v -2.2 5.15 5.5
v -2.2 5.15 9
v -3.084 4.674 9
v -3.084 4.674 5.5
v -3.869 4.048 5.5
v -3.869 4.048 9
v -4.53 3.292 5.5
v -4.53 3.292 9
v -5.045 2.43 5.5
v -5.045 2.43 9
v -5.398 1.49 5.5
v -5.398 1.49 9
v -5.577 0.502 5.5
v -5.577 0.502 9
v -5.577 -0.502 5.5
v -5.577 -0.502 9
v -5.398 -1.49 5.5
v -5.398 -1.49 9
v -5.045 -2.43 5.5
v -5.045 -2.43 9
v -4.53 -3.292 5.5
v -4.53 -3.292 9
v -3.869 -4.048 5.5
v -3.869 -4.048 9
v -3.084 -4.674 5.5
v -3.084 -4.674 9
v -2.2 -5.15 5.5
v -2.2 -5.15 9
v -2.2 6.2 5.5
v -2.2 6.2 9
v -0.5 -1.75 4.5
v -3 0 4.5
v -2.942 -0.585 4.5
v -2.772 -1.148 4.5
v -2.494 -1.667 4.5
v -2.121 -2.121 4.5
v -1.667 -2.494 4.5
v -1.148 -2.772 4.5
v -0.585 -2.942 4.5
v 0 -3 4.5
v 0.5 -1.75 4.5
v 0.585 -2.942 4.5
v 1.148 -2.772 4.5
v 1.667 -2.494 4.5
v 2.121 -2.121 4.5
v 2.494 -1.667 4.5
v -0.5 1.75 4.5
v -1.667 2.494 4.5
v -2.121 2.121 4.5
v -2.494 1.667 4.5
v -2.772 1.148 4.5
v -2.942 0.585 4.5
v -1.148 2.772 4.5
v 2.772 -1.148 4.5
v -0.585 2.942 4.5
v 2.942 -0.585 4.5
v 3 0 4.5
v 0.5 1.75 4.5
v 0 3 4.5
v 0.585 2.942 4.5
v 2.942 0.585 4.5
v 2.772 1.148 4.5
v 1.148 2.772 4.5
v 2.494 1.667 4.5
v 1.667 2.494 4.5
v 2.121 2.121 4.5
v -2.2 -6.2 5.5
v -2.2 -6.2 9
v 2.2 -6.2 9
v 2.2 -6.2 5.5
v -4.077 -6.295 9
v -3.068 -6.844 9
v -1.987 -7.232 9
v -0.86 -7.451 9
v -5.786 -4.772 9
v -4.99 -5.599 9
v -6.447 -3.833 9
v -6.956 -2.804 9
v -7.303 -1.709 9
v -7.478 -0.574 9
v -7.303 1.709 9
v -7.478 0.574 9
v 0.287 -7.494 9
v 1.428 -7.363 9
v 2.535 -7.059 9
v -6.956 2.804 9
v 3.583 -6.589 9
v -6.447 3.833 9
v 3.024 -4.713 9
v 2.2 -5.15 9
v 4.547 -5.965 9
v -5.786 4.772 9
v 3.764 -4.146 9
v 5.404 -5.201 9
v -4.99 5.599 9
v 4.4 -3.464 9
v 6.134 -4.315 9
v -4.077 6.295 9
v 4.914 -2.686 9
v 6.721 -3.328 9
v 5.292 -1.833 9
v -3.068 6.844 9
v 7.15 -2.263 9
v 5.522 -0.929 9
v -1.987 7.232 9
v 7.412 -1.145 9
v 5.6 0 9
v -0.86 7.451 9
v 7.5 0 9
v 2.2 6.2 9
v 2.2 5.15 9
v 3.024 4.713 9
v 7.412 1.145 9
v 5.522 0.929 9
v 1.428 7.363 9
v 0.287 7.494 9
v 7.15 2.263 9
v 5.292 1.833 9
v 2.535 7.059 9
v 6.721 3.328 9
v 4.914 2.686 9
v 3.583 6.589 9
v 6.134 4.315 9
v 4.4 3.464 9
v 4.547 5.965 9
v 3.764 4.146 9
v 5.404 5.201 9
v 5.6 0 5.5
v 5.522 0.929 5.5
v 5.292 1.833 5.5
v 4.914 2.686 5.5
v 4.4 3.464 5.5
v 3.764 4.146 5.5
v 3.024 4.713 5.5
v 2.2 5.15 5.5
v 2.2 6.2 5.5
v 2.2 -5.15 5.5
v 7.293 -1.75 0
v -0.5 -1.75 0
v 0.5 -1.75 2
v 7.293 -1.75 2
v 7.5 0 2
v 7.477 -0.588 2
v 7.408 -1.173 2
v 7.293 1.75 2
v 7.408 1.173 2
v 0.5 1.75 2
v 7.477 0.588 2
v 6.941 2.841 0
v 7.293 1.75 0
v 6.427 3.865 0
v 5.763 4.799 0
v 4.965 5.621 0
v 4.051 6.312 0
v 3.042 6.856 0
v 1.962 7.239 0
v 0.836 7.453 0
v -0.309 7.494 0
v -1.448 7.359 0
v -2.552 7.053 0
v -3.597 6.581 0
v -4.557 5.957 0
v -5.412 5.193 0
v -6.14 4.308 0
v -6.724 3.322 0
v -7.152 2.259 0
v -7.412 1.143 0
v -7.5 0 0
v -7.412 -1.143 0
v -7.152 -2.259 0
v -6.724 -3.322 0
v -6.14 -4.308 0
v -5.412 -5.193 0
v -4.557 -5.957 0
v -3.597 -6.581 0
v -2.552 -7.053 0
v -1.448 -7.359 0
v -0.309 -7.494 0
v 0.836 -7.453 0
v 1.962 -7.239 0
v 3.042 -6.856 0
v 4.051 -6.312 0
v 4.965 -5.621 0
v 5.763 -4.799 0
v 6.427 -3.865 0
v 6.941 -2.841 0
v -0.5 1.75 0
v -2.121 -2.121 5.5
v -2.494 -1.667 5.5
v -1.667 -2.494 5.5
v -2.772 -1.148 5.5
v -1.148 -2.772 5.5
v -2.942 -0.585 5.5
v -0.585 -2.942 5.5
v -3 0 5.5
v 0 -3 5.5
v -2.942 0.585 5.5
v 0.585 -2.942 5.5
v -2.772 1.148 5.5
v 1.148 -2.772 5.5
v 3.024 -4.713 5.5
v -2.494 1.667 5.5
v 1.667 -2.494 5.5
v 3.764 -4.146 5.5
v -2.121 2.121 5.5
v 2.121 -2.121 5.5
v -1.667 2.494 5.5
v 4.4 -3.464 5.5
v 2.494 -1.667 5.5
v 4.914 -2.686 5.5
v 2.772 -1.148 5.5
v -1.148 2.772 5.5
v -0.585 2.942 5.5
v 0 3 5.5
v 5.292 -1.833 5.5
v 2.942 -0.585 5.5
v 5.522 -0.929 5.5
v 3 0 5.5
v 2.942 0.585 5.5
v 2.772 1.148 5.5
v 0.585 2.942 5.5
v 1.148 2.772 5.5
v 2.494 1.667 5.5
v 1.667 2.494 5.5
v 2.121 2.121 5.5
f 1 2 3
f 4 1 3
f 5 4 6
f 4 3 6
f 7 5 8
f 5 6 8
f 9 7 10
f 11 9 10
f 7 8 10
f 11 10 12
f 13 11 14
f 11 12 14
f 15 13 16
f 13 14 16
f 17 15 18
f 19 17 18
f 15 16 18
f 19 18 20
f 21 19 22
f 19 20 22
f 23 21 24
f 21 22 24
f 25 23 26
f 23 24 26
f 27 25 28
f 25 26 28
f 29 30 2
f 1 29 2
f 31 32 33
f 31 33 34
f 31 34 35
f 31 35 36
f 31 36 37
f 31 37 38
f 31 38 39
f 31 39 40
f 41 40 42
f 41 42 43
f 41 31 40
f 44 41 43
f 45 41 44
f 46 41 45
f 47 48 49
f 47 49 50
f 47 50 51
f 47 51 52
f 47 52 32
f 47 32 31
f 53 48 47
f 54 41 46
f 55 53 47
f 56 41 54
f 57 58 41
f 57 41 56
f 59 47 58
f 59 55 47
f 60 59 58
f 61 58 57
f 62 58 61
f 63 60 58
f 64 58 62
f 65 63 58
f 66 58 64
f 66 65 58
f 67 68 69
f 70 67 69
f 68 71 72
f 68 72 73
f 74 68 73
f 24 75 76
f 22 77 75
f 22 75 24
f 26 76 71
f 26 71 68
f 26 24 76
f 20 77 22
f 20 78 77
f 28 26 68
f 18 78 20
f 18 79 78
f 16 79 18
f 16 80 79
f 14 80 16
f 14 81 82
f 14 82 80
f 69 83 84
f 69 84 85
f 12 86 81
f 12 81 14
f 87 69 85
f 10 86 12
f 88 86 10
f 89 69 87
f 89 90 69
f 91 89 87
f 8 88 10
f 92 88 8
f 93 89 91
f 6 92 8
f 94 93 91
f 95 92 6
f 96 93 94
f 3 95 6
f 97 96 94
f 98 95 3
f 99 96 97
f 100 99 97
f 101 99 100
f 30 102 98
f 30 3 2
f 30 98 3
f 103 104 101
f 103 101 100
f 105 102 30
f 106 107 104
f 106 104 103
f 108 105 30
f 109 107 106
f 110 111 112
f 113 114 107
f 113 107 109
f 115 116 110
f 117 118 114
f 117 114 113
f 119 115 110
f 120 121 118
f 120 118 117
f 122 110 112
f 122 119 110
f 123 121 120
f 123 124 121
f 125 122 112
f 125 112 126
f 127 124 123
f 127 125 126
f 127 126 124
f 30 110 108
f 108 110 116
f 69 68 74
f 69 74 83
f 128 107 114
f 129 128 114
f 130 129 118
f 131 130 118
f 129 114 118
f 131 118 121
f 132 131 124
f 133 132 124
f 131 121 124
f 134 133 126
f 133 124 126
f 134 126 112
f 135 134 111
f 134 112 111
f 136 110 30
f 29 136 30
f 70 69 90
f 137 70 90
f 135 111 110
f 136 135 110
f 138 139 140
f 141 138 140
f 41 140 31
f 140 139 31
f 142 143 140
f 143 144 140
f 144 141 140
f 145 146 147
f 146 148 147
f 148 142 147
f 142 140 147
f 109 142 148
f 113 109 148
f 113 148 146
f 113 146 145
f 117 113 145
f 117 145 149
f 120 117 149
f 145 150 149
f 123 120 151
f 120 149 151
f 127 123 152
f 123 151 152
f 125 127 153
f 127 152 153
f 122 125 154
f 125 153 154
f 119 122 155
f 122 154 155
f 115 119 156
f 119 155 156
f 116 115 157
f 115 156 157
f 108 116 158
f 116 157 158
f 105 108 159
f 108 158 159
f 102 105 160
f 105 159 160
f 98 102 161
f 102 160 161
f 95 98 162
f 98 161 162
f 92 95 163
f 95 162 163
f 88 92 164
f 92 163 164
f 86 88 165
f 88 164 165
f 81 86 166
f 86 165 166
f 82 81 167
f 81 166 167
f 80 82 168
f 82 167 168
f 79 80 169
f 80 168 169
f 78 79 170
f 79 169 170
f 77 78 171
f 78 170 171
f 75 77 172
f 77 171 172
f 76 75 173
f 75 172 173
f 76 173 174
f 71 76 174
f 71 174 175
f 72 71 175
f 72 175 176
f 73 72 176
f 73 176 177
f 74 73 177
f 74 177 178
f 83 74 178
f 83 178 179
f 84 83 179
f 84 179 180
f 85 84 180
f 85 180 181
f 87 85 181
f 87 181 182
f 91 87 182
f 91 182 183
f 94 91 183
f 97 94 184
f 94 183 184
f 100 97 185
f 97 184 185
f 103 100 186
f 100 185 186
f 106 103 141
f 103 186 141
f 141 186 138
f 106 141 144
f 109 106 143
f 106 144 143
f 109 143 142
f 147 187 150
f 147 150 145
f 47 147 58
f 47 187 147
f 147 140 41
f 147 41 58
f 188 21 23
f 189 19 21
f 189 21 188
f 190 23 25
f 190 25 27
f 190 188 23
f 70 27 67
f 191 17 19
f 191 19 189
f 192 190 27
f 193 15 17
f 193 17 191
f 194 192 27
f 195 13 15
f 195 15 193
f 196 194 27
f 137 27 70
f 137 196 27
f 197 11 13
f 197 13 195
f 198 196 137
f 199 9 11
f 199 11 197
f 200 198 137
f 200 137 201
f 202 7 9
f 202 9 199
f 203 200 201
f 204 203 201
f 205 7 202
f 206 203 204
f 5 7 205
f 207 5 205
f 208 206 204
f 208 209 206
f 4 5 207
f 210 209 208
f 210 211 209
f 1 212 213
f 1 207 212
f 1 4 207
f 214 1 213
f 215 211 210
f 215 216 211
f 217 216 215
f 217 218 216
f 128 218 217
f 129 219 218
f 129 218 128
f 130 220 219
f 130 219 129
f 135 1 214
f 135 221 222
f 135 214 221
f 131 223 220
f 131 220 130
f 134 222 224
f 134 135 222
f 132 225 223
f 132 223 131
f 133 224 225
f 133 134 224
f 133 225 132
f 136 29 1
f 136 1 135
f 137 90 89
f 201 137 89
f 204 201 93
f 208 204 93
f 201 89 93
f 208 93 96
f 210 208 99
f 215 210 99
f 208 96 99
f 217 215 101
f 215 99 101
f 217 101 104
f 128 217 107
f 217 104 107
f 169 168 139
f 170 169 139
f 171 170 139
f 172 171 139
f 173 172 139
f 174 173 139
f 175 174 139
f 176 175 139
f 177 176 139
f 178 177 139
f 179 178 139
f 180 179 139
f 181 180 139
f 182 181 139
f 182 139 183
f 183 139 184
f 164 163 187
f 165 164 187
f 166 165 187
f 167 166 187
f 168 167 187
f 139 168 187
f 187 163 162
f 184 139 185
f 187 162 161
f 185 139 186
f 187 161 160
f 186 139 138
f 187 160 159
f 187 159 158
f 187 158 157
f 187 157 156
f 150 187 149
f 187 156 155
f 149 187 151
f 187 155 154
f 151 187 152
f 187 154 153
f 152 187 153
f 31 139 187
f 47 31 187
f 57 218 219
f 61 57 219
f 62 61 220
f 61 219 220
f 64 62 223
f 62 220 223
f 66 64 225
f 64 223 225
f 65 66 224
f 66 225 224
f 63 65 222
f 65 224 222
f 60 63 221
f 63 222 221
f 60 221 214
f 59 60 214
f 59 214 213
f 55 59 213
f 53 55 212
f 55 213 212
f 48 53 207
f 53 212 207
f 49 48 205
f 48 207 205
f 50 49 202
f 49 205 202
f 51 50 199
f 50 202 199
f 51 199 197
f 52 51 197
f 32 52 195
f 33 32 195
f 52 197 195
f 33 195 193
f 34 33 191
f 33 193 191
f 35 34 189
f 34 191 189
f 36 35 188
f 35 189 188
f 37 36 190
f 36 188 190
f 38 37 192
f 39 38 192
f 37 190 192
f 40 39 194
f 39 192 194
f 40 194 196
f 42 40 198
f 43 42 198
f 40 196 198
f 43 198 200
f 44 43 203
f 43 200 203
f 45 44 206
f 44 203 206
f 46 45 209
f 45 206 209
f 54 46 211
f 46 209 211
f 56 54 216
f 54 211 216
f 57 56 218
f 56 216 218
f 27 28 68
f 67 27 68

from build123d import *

# Parameters (mm, degrees)
F0_R     = 7.5
F0_W     = 1
F0_H     = 3.5
F1_DEPTH = 9
F2_W     = 3.5
F2_H     = 2
F3_DEPTH = 10
F4_W     = 1
F4_H     = 3.5
F5_DEPTH = 3.5
F6_R     = 3
F6_W     = 1
F6_H     = 3.5
F7_DEPTH = 1


with BuildPart() as f1:
    # F0 (on Top) → F1 (new body)
    with BuildSketch(Plane.XY):
        Circle(F0_R)
        Rectangle(F0_W, F0_H, mode=Mode.SUBTRACT)
    extrude(amount=F1_DEPTH)

    # F2 (on Right) → F3 (cut)
    with BuildSketch(Plane.YZ):
        with Locations((0, 1)):
            Rectangle(F2_W, F2_H)
    extrude(amount=F3_DEPTH, mode=Mode.SUBTRACT)

    # F4 (on face) → F5 (cut)
    with BuildSketch(Plane.XY.offset(9)):
        with BuildLine():
            Line((-2.2, -5.1497572758), (-2.2, 5.1497572758))
            ThreePointArc((-2.2, 5.1497572758), (-5.6, 0), (-2.2, -5.1497572758))
        make_face()
        with BuildLine():
            Line((2.2, 6.2), (-2.2, 6.2))
            Line((-2.2, 6.2), (-2.2, 5.1497572758))
            ThreePointArc((-2.2, 5.1497572758), (0, 5.6), (2.2, 5.1497572758))
            Line((2.2, 5.1497572758), (2.2, 6.2))
        make_face()
        with BuildLine():
            ThreePointArc((2.2, 5.1497572758), (0, 5.6), (-2.2, 5.1497572758))
            Line((-2.2, 5.1497572758), (-2.2, -5.1497572758))
            ThreePointArc((-2.2, -5.1497572758), (0, -5.6), (2.2, -5.1497572758))
            Line((2.2, -5.1497572758), (2.2, 5.1497572758))
        make_face()
        Rectangle(F4_W, F4_H, mode=Mode.SUBTRACT)
        with BuildLine():
            ThreePointArc((5.6, 0), (4.6733285782, 3.0854497241), (2.2, 5.1497572758))
            Line((2.2, 5.1497572758), (2.2, -5.1497572758))
            ThreePointArc((2.2, -5.1497572758), (4.6733285782, -3.0854497241), (5.6, 0))
        make_face()
        with BuildLine():
            ThreePointArc((2.2, -5.1497572758), (0, -5.6), (-2.2, -5.1497572758))
            Line((-2.2, -5.1497572758), (-2.2, -6.2))
            Line((-2.2, -6.2), (2.2, -6.2))
            Line((2.2, -6.2), (2.2, -5.1497572758))
        make_face()
    extrude(amount=-F5_DEPTH, mode=Mode.SUBTRACT)

    # F6 (on face) → F7 (cut)
    with BuildSketch(Plane.XY.offset(5.5)):
        Circle(F6_R)
        Rectangle(F6_W, F6_H, mode=Mode.SUBTRACT)
    extrude(amount=-F7_DEPTH, mode=Mode.SUBTRACT)


solid = f1.part
